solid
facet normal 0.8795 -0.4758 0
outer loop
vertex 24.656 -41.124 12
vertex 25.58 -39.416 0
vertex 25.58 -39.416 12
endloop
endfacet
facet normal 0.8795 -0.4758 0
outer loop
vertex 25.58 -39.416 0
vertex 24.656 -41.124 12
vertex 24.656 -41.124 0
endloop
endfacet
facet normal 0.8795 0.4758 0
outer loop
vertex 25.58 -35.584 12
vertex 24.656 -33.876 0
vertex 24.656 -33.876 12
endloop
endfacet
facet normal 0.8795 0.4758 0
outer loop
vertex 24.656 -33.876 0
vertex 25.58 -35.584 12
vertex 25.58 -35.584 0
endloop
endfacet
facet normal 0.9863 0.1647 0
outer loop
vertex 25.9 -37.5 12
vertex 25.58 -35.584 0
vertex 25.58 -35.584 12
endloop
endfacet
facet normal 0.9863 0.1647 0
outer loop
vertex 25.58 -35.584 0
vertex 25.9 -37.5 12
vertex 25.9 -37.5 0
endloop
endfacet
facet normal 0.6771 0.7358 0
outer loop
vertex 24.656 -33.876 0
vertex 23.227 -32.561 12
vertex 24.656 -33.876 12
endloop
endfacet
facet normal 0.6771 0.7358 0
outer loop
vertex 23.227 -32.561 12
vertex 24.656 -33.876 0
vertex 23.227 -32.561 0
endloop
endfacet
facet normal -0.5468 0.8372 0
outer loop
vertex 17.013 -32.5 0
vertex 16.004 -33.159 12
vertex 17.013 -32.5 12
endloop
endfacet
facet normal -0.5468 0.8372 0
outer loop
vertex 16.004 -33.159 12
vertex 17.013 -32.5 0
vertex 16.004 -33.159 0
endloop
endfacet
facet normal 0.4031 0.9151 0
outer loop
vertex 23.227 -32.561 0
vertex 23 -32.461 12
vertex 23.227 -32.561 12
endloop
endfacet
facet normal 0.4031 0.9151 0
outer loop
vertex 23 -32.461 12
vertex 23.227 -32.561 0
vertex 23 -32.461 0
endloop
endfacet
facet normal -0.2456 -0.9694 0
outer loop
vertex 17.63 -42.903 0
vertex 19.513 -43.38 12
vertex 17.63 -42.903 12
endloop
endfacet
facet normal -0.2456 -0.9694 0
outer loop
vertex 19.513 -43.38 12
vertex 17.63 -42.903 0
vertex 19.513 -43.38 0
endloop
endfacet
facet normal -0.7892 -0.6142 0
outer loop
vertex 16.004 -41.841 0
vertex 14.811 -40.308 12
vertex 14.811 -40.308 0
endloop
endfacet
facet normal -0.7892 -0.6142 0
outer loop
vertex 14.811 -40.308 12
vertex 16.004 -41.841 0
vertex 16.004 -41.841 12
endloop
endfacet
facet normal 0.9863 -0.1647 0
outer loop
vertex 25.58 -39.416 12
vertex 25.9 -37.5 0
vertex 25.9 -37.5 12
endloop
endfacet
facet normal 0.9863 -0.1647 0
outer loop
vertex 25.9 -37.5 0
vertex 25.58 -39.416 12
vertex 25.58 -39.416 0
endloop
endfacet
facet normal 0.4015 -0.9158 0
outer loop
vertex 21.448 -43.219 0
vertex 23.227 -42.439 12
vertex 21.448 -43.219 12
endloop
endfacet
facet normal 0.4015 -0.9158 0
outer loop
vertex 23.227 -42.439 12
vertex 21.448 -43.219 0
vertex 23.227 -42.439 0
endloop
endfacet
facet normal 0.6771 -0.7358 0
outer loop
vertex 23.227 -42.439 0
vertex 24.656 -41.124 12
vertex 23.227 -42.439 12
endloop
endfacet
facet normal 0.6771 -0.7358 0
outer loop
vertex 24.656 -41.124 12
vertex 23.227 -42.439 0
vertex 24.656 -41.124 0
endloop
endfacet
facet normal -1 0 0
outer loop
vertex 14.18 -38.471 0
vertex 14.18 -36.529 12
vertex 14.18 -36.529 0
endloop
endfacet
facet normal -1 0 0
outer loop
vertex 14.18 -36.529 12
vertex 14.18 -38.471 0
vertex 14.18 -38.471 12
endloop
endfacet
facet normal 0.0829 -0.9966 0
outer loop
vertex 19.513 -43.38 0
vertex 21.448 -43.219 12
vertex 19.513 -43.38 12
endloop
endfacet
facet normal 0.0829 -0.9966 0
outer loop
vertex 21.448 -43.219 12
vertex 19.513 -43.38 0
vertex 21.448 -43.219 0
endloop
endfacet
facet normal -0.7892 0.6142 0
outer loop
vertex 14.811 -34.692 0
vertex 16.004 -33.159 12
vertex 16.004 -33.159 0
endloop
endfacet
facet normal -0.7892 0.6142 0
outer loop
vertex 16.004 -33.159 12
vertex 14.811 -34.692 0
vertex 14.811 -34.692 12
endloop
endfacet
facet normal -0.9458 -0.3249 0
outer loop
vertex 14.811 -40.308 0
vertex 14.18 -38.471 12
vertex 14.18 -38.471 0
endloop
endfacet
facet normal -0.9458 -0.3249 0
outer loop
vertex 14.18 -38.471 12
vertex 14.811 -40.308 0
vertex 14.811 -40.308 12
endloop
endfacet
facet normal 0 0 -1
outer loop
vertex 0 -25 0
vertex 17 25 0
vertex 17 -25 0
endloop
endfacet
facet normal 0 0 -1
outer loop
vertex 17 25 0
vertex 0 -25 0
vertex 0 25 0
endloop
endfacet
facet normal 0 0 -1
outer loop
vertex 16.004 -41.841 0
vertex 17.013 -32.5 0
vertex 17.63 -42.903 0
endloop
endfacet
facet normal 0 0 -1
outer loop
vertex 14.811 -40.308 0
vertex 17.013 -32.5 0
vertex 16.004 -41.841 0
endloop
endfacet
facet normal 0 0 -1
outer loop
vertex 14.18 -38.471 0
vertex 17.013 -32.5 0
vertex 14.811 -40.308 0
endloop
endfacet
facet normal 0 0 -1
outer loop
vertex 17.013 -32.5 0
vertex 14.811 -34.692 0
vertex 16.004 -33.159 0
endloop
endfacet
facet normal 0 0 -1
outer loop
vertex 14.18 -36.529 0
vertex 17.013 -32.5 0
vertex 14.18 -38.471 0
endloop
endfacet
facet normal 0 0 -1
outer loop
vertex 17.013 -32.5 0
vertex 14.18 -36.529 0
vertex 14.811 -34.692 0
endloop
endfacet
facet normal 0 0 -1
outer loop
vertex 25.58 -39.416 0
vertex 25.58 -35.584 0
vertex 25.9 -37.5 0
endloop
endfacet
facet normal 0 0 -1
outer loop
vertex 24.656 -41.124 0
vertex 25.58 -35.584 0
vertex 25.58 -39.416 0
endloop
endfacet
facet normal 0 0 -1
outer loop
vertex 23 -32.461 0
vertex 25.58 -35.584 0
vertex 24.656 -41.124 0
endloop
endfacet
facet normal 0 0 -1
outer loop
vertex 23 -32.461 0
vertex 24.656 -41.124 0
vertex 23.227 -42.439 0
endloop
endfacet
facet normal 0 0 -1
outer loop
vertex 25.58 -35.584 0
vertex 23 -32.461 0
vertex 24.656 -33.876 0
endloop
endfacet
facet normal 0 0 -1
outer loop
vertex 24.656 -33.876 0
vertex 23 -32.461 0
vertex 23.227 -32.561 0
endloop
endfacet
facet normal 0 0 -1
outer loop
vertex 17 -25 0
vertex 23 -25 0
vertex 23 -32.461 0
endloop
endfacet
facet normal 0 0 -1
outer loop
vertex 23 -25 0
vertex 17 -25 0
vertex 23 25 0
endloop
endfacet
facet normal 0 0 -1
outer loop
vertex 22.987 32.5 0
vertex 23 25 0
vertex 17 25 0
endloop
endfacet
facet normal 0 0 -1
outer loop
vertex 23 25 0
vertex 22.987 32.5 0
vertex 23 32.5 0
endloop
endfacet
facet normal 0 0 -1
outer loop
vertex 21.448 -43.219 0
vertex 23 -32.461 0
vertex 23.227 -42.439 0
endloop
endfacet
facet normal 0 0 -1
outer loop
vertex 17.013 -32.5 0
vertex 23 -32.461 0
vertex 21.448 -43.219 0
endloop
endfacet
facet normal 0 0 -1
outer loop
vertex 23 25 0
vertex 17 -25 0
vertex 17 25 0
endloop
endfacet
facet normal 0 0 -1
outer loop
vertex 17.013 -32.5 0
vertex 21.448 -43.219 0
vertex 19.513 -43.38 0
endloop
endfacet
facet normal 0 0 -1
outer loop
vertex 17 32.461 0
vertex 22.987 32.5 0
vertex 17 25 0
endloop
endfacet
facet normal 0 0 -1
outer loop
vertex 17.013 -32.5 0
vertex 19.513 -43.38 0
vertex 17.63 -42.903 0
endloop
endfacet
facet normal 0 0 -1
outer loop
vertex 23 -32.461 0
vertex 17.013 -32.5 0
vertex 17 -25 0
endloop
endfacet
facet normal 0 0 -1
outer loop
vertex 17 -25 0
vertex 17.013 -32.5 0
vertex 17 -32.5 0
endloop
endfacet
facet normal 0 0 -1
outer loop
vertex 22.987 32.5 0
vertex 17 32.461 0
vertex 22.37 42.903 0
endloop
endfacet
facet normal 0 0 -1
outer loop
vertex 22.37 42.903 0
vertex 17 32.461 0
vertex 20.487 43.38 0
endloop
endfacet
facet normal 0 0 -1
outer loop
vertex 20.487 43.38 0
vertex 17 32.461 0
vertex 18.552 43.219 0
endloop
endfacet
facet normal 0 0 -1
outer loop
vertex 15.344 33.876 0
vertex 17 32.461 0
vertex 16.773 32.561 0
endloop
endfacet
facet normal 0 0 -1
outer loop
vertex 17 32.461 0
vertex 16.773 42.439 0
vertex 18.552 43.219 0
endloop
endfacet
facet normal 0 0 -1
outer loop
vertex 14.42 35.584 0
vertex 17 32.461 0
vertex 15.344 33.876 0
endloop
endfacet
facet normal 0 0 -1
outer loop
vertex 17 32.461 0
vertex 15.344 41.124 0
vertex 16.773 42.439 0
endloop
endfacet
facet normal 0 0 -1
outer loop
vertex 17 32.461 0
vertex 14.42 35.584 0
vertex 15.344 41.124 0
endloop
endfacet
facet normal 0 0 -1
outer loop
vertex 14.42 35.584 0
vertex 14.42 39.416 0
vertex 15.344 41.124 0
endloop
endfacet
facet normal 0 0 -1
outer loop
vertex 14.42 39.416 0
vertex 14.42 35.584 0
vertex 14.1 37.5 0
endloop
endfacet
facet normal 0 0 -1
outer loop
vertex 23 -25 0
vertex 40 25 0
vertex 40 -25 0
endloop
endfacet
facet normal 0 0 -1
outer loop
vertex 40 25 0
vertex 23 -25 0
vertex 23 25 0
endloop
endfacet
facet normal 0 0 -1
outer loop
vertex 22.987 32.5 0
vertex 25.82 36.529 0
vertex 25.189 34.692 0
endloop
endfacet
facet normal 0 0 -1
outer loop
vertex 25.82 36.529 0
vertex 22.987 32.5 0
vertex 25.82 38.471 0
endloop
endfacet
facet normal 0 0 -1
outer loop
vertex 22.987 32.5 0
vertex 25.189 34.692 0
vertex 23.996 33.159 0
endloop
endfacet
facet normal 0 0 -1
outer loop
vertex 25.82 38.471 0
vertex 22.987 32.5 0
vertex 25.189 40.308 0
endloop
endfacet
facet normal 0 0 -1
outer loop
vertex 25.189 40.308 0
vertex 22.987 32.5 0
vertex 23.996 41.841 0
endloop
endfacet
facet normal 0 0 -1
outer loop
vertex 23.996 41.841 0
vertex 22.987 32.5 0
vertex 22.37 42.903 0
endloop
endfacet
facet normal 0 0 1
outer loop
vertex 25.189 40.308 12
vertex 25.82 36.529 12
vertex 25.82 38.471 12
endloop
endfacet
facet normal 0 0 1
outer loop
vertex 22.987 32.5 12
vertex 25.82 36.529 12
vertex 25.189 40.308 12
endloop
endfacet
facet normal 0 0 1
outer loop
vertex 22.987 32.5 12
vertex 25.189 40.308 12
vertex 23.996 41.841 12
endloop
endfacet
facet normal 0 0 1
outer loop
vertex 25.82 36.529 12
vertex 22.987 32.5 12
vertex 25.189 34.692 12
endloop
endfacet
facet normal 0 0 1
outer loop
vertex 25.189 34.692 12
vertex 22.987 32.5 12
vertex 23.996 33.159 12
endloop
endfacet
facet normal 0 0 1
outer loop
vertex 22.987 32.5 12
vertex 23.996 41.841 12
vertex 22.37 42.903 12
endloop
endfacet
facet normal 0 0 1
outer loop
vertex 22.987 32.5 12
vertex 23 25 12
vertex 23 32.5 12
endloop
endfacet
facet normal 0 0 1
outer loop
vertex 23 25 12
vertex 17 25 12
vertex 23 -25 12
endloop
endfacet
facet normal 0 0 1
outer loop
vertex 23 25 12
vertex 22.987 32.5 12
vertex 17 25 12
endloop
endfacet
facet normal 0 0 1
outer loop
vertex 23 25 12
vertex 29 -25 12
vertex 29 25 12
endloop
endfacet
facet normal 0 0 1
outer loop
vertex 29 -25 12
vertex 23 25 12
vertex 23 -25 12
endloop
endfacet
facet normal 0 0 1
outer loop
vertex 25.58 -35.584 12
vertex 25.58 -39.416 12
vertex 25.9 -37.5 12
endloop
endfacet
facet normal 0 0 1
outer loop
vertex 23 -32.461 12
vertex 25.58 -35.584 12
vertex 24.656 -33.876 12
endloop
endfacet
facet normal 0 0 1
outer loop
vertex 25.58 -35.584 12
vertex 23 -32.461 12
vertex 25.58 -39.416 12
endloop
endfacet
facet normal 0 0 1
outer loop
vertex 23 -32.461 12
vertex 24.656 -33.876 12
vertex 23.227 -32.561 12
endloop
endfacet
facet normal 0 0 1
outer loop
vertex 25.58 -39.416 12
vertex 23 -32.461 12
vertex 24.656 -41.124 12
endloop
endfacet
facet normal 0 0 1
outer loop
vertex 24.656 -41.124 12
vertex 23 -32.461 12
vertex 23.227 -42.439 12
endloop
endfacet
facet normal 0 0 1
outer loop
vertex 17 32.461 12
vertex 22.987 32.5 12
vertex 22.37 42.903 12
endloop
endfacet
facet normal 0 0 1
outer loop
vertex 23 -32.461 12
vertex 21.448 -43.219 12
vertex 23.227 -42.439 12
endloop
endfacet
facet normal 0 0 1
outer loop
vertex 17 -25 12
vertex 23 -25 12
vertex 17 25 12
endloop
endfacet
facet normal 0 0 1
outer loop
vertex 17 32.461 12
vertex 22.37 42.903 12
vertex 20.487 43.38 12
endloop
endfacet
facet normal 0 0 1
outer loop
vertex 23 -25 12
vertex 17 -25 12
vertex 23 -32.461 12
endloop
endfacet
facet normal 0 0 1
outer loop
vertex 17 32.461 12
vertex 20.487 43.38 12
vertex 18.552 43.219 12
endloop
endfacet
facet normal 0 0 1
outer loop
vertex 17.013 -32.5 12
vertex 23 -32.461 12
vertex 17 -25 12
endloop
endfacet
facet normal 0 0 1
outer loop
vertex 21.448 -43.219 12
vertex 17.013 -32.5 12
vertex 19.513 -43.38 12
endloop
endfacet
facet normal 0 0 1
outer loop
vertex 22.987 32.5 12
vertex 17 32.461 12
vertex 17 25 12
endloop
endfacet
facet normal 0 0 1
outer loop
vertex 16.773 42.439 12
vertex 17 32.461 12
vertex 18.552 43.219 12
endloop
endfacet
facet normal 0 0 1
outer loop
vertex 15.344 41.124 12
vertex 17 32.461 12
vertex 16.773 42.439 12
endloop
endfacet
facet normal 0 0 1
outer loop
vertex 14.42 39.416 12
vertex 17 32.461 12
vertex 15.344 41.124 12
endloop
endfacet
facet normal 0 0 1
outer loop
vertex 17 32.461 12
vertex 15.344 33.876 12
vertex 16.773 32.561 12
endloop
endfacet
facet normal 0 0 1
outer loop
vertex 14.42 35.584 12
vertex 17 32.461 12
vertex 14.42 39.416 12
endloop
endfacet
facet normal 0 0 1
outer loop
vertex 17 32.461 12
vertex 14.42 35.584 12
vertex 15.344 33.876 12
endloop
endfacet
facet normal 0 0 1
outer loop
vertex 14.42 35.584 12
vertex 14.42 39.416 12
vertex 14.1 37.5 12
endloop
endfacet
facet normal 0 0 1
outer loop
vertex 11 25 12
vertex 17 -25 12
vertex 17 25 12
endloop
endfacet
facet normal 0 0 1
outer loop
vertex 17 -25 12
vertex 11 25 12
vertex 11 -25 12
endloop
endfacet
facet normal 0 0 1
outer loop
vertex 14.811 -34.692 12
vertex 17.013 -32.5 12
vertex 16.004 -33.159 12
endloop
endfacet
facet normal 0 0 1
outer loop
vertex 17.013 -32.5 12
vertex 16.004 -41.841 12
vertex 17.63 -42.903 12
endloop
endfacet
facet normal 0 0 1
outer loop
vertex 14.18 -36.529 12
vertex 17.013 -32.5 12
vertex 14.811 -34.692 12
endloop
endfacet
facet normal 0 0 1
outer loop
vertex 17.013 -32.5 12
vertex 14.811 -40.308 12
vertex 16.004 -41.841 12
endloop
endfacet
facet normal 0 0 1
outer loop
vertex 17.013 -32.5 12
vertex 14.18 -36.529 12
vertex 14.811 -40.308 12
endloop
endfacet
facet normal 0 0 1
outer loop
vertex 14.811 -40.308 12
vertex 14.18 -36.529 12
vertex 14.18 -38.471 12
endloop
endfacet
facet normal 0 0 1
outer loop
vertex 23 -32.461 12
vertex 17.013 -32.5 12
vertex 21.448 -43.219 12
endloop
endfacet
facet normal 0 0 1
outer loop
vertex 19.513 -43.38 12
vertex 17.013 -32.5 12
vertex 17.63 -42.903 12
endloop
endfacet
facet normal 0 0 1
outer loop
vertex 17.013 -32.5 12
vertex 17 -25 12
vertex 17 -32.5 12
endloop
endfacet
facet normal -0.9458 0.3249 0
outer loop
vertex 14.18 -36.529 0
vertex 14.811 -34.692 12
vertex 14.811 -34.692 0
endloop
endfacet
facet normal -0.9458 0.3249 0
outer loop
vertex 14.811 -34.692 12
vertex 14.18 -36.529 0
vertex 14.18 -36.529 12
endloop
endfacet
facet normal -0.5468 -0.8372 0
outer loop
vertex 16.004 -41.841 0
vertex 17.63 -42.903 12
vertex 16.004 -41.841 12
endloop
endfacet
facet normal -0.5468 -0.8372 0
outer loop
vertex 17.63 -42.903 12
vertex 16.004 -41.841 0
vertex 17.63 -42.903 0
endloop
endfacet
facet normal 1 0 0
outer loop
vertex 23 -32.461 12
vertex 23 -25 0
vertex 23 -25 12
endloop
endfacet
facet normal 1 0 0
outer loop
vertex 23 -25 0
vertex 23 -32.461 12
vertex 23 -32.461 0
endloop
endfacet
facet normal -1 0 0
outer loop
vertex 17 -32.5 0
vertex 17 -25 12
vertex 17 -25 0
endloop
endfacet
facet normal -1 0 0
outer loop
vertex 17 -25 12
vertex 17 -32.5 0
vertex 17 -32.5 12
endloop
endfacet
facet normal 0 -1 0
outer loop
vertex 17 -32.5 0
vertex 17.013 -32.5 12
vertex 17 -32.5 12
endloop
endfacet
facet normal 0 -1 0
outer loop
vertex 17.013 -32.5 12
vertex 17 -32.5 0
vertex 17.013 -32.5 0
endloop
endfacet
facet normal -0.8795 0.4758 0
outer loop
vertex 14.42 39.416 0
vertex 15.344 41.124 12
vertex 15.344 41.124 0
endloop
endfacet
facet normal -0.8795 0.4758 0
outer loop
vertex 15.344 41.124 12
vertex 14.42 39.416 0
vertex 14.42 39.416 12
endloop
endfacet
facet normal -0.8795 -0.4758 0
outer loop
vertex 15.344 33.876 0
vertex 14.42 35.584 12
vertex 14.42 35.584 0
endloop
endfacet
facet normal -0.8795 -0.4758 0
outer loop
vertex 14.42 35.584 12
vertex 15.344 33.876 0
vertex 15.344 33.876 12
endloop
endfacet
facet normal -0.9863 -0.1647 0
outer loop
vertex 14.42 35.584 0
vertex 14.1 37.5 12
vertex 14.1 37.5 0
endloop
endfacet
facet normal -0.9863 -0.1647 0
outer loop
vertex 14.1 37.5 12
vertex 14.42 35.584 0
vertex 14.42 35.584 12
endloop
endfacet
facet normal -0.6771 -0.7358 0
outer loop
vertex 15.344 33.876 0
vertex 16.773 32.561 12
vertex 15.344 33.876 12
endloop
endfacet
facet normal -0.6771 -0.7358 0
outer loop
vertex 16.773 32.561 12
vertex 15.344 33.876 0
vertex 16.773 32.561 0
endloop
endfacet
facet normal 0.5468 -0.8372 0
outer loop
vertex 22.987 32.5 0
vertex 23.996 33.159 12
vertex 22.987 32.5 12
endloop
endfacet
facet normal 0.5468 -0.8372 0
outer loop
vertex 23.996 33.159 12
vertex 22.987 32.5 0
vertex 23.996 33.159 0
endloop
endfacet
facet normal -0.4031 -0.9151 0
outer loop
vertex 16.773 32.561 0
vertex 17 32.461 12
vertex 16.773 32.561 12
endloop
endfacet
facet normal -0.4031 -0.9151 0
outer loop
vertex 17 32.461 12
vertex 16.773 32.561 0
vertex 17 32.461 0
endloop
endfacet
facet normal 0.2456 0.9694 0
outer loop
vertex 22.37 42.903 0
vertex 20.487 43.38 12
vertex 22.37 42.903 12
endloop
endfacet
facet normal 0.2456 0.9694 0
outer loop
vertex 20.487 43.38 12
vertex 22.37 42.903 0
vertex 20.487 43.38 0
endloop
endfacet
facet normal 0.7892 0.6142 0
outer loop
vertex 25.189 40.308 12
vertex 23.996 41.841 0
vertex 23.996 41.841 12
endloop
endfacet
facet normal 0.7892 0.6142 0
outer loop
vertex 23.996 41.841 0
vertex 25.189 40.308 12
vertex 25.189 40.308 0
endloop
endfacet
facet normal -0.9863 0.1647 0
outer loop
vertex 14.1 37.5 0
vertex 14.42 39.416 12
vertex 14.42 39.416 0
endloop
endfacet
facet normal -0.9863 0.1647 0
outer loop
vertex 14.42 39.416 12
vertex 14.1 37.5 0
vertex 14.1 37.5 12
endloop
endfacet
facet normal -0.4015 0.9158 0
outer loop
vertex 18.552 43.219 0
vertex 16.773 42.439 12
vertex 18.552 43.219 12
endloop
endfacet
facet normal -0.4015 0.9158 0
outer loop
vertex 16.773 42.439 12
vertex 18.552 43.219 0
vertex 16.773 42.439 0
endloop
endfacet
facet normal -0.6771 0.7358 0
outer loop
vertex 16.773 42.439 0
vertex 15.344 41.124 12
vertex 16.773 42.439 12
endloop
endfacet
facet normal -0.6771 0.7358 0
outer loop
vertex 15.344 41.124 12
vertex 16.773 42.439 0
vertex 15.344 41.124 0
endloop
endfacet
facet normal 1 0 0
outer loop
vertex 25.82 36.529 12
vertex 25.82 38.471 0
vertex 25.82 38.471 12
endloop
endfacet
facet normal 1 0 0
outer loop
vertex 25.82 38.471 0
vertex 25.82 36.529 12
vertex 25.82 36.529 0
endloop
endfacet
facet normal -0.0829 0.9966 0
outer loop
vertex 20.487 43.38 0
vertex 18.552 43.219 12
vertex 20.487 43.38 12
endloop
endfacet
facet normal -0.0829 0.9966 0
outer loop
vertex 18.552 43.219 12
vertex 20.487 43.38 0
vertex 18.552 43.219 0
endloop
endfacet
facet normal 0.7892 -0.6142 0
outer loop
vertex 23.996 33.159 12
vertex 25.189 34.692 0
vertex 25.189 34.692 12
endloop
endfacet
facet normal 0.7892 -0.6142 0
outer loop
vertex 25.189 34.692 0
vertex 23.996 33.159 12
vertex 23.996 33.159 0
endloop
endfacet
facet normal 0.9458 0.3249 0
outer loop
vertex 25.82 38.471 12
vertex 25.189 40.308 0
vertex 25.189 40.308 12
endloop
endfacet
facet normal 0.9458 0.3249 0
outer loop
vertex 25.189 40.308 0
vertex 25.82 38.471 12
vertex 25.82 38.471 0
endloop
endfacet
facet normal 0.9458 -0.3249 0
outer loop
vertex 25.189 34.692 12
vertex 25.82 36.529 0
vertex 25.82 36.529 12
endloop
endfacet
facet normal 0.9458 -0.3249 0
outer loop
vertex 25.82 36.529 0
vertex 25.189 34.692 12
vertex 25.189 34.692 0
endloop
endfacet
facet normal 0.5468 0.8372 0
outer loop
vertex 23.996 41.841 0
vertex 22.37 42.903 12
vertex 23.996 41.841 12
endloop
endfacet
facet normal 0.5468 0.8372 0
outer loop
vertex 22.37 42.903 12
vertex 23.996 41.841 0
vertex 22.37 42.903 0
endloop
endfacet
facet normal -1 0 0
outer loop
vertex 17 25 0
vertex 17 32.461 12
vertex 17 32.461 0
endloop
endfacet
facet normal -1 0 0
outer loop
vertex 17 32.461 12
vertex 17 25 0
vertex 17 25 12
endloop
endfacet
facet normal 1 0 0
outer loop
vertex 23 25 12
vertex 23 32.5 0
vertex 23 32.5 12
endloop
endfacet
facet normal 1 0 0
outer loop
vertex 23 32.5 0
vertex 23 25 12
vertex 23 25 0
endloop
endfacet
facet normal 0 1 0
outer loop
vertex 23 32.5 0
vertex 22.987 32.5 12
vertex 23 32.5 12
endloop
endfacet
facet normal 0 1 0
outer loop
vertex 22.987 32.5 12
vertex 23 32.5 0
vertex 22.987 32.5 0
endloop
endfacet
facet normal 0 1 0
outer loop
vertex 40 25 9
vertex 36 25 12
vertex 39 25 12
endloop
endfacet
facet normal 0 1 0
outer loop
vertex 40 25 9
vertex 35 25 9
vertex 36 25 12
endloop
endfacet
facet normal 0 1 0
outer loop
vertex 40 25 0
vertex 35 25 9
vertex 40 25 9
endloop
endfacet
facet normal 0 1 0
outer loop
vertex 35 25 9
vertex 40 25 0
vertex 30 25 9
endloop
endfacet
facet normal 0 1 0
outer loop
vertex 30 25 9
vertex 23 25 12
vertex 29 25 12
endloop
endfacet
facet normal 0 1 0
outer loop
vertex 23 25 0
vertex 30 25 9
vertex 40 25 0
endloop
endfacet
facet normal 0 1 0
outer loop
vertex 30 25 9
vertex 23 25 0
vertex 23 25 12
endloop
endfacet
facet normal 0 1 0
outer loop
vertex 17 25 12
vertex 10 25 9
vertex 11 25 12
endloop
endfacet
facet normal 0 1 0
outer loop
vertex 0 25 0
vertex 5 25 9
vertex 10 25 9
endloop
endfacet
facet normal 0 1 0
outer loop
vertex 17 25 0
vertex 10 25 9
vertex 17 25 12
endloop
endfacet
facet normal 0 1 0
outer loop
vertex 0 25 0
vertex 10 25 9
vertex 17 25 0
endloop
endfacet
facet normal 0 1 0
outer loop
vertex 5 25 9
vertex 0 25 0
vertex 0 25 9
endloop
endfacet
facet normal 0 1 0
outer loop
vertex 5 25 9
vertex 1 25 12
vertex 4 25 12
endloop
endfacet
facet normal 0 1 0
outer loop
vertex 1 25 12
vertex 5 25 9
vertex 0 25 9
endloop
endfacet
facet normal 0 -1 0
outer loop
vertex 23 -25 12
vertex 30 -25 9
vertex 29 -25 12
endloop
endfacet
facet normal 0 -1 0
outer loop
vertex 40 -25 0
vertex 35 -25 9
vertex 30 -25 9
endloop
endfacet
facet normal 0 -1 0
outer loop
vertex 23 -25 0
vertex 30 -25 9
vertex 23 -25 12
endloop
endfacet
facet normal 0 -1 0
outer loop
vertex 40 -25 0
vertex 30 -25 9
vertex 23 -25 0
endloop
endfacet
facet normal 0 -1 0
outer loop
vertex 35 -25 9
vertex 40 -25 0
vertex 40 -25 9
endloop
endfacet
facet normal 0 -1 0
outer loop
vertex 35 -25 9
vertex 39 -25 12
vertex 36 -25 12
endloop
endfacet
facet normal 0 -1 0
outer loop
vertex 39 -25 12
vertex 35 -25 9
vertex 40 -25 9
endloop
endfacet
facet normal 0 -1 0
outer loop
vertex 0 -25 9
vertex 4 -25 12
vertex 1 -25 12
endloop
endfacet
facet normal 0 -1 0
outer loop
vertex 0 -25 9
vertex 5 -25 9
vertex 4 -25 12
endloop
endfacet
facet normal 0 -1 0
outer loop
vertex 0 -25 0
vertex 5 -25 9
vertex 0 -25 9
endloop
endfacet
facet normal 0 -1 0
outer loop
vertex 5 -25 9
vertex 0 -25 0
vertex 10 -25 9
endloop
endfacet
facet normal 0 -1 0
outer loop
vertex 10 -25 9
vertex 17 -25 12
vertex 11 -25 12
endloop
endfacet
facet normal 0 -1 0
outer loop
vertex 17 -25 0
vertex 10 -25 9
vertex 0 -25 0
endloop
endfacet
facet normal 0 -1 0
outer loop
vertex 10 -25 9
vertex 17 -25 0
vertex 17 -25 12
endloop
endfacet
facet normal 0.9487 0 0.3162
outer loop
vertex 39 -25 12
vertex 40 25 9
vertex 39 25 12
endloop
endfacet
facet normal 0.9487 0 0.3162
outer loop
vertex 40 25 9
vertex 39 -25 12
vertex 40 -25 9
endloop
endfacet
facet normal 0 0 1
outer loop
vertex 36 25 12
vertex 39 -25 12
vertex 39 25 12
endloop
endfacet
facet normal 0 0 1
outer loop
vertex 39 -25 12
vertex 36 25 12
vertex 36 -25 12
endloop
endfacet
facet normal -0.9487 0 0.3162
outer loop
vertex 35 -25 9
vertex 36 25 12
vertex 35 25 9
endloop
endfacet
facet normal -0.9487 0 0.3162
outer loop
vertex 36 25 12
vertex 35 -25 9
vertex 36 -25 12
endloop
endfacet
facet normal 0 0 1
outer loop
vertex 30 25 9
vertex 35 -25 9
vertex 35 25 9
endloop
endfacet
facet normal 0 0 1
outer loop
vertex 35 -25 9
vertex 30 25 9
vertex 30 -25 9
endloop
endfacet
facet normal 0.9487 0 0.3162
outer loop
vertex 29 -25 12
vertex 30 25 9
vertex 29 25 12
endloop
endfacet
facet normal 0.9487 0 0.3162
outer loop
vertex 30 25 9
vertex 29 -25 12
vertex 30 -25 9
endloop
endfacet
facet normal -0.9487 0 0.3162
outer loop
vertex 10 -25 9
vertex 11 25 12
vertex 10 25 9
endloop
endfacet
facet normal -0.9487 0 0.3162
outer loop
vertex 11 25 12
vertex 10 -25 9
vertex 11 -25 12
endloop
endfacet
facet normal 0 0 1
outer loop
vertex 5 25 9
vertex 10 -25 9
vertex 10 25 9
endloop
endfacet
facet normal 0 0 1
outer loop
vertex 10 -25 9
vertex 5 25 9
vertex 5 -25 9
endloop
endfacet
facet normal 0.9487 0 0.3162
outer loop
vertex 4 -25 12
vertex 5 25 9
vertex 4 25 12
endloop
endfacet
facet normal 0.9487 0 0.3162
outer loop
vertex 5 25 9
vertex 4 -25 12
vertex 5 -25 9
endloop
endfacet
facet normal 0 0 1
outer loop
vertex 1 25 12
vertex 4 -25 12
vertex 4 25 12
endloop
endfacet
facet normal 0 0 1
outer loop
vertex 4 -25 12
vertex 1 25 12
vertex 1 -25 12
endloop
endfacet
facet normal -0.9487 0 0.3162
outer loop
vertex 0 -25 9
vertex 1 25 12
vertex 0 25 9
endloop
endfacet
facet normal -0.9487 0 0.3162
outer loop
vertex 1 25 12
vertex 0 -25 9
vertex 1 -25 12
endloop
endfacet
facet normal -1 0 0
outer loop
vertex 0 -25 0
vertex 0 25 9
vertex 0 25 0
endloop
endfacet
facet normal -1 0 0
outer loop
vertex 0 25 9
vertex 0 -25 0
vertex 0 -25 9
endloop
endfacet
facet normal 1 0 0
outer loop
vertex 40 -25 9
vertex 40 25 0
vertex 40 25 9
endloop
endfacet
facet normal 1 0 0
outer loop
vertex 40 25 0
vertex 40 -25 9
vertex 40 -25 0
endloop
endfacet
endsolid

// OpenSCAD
track_length=50;

rotate (a=[90,0,0]) linear_extrude(height =track_length, center = true) polygon(points = [ [0,0], [0,9], [1,12],[4,12],[5,9],[10,9],[11,12],[29,12],[30,9],[35,9],[36,12], [39,12],[40,9], [40,0]], path = [[0,1,2,3,4,5,6,7,8,9,10,11,12,13,14]]);

//peg
module peg(){
	translate ([0,-12.5,0])
	union(){
		cylinder(12,5.9,5.9);
		translate ([-3,5,0]) cube(size=[6,8,12]);
	}
}

translate ([20,-track_length/2,0]) peg();

translate ([20,track_length/2,0]) rotate(a=[0,0,180]) peg();
